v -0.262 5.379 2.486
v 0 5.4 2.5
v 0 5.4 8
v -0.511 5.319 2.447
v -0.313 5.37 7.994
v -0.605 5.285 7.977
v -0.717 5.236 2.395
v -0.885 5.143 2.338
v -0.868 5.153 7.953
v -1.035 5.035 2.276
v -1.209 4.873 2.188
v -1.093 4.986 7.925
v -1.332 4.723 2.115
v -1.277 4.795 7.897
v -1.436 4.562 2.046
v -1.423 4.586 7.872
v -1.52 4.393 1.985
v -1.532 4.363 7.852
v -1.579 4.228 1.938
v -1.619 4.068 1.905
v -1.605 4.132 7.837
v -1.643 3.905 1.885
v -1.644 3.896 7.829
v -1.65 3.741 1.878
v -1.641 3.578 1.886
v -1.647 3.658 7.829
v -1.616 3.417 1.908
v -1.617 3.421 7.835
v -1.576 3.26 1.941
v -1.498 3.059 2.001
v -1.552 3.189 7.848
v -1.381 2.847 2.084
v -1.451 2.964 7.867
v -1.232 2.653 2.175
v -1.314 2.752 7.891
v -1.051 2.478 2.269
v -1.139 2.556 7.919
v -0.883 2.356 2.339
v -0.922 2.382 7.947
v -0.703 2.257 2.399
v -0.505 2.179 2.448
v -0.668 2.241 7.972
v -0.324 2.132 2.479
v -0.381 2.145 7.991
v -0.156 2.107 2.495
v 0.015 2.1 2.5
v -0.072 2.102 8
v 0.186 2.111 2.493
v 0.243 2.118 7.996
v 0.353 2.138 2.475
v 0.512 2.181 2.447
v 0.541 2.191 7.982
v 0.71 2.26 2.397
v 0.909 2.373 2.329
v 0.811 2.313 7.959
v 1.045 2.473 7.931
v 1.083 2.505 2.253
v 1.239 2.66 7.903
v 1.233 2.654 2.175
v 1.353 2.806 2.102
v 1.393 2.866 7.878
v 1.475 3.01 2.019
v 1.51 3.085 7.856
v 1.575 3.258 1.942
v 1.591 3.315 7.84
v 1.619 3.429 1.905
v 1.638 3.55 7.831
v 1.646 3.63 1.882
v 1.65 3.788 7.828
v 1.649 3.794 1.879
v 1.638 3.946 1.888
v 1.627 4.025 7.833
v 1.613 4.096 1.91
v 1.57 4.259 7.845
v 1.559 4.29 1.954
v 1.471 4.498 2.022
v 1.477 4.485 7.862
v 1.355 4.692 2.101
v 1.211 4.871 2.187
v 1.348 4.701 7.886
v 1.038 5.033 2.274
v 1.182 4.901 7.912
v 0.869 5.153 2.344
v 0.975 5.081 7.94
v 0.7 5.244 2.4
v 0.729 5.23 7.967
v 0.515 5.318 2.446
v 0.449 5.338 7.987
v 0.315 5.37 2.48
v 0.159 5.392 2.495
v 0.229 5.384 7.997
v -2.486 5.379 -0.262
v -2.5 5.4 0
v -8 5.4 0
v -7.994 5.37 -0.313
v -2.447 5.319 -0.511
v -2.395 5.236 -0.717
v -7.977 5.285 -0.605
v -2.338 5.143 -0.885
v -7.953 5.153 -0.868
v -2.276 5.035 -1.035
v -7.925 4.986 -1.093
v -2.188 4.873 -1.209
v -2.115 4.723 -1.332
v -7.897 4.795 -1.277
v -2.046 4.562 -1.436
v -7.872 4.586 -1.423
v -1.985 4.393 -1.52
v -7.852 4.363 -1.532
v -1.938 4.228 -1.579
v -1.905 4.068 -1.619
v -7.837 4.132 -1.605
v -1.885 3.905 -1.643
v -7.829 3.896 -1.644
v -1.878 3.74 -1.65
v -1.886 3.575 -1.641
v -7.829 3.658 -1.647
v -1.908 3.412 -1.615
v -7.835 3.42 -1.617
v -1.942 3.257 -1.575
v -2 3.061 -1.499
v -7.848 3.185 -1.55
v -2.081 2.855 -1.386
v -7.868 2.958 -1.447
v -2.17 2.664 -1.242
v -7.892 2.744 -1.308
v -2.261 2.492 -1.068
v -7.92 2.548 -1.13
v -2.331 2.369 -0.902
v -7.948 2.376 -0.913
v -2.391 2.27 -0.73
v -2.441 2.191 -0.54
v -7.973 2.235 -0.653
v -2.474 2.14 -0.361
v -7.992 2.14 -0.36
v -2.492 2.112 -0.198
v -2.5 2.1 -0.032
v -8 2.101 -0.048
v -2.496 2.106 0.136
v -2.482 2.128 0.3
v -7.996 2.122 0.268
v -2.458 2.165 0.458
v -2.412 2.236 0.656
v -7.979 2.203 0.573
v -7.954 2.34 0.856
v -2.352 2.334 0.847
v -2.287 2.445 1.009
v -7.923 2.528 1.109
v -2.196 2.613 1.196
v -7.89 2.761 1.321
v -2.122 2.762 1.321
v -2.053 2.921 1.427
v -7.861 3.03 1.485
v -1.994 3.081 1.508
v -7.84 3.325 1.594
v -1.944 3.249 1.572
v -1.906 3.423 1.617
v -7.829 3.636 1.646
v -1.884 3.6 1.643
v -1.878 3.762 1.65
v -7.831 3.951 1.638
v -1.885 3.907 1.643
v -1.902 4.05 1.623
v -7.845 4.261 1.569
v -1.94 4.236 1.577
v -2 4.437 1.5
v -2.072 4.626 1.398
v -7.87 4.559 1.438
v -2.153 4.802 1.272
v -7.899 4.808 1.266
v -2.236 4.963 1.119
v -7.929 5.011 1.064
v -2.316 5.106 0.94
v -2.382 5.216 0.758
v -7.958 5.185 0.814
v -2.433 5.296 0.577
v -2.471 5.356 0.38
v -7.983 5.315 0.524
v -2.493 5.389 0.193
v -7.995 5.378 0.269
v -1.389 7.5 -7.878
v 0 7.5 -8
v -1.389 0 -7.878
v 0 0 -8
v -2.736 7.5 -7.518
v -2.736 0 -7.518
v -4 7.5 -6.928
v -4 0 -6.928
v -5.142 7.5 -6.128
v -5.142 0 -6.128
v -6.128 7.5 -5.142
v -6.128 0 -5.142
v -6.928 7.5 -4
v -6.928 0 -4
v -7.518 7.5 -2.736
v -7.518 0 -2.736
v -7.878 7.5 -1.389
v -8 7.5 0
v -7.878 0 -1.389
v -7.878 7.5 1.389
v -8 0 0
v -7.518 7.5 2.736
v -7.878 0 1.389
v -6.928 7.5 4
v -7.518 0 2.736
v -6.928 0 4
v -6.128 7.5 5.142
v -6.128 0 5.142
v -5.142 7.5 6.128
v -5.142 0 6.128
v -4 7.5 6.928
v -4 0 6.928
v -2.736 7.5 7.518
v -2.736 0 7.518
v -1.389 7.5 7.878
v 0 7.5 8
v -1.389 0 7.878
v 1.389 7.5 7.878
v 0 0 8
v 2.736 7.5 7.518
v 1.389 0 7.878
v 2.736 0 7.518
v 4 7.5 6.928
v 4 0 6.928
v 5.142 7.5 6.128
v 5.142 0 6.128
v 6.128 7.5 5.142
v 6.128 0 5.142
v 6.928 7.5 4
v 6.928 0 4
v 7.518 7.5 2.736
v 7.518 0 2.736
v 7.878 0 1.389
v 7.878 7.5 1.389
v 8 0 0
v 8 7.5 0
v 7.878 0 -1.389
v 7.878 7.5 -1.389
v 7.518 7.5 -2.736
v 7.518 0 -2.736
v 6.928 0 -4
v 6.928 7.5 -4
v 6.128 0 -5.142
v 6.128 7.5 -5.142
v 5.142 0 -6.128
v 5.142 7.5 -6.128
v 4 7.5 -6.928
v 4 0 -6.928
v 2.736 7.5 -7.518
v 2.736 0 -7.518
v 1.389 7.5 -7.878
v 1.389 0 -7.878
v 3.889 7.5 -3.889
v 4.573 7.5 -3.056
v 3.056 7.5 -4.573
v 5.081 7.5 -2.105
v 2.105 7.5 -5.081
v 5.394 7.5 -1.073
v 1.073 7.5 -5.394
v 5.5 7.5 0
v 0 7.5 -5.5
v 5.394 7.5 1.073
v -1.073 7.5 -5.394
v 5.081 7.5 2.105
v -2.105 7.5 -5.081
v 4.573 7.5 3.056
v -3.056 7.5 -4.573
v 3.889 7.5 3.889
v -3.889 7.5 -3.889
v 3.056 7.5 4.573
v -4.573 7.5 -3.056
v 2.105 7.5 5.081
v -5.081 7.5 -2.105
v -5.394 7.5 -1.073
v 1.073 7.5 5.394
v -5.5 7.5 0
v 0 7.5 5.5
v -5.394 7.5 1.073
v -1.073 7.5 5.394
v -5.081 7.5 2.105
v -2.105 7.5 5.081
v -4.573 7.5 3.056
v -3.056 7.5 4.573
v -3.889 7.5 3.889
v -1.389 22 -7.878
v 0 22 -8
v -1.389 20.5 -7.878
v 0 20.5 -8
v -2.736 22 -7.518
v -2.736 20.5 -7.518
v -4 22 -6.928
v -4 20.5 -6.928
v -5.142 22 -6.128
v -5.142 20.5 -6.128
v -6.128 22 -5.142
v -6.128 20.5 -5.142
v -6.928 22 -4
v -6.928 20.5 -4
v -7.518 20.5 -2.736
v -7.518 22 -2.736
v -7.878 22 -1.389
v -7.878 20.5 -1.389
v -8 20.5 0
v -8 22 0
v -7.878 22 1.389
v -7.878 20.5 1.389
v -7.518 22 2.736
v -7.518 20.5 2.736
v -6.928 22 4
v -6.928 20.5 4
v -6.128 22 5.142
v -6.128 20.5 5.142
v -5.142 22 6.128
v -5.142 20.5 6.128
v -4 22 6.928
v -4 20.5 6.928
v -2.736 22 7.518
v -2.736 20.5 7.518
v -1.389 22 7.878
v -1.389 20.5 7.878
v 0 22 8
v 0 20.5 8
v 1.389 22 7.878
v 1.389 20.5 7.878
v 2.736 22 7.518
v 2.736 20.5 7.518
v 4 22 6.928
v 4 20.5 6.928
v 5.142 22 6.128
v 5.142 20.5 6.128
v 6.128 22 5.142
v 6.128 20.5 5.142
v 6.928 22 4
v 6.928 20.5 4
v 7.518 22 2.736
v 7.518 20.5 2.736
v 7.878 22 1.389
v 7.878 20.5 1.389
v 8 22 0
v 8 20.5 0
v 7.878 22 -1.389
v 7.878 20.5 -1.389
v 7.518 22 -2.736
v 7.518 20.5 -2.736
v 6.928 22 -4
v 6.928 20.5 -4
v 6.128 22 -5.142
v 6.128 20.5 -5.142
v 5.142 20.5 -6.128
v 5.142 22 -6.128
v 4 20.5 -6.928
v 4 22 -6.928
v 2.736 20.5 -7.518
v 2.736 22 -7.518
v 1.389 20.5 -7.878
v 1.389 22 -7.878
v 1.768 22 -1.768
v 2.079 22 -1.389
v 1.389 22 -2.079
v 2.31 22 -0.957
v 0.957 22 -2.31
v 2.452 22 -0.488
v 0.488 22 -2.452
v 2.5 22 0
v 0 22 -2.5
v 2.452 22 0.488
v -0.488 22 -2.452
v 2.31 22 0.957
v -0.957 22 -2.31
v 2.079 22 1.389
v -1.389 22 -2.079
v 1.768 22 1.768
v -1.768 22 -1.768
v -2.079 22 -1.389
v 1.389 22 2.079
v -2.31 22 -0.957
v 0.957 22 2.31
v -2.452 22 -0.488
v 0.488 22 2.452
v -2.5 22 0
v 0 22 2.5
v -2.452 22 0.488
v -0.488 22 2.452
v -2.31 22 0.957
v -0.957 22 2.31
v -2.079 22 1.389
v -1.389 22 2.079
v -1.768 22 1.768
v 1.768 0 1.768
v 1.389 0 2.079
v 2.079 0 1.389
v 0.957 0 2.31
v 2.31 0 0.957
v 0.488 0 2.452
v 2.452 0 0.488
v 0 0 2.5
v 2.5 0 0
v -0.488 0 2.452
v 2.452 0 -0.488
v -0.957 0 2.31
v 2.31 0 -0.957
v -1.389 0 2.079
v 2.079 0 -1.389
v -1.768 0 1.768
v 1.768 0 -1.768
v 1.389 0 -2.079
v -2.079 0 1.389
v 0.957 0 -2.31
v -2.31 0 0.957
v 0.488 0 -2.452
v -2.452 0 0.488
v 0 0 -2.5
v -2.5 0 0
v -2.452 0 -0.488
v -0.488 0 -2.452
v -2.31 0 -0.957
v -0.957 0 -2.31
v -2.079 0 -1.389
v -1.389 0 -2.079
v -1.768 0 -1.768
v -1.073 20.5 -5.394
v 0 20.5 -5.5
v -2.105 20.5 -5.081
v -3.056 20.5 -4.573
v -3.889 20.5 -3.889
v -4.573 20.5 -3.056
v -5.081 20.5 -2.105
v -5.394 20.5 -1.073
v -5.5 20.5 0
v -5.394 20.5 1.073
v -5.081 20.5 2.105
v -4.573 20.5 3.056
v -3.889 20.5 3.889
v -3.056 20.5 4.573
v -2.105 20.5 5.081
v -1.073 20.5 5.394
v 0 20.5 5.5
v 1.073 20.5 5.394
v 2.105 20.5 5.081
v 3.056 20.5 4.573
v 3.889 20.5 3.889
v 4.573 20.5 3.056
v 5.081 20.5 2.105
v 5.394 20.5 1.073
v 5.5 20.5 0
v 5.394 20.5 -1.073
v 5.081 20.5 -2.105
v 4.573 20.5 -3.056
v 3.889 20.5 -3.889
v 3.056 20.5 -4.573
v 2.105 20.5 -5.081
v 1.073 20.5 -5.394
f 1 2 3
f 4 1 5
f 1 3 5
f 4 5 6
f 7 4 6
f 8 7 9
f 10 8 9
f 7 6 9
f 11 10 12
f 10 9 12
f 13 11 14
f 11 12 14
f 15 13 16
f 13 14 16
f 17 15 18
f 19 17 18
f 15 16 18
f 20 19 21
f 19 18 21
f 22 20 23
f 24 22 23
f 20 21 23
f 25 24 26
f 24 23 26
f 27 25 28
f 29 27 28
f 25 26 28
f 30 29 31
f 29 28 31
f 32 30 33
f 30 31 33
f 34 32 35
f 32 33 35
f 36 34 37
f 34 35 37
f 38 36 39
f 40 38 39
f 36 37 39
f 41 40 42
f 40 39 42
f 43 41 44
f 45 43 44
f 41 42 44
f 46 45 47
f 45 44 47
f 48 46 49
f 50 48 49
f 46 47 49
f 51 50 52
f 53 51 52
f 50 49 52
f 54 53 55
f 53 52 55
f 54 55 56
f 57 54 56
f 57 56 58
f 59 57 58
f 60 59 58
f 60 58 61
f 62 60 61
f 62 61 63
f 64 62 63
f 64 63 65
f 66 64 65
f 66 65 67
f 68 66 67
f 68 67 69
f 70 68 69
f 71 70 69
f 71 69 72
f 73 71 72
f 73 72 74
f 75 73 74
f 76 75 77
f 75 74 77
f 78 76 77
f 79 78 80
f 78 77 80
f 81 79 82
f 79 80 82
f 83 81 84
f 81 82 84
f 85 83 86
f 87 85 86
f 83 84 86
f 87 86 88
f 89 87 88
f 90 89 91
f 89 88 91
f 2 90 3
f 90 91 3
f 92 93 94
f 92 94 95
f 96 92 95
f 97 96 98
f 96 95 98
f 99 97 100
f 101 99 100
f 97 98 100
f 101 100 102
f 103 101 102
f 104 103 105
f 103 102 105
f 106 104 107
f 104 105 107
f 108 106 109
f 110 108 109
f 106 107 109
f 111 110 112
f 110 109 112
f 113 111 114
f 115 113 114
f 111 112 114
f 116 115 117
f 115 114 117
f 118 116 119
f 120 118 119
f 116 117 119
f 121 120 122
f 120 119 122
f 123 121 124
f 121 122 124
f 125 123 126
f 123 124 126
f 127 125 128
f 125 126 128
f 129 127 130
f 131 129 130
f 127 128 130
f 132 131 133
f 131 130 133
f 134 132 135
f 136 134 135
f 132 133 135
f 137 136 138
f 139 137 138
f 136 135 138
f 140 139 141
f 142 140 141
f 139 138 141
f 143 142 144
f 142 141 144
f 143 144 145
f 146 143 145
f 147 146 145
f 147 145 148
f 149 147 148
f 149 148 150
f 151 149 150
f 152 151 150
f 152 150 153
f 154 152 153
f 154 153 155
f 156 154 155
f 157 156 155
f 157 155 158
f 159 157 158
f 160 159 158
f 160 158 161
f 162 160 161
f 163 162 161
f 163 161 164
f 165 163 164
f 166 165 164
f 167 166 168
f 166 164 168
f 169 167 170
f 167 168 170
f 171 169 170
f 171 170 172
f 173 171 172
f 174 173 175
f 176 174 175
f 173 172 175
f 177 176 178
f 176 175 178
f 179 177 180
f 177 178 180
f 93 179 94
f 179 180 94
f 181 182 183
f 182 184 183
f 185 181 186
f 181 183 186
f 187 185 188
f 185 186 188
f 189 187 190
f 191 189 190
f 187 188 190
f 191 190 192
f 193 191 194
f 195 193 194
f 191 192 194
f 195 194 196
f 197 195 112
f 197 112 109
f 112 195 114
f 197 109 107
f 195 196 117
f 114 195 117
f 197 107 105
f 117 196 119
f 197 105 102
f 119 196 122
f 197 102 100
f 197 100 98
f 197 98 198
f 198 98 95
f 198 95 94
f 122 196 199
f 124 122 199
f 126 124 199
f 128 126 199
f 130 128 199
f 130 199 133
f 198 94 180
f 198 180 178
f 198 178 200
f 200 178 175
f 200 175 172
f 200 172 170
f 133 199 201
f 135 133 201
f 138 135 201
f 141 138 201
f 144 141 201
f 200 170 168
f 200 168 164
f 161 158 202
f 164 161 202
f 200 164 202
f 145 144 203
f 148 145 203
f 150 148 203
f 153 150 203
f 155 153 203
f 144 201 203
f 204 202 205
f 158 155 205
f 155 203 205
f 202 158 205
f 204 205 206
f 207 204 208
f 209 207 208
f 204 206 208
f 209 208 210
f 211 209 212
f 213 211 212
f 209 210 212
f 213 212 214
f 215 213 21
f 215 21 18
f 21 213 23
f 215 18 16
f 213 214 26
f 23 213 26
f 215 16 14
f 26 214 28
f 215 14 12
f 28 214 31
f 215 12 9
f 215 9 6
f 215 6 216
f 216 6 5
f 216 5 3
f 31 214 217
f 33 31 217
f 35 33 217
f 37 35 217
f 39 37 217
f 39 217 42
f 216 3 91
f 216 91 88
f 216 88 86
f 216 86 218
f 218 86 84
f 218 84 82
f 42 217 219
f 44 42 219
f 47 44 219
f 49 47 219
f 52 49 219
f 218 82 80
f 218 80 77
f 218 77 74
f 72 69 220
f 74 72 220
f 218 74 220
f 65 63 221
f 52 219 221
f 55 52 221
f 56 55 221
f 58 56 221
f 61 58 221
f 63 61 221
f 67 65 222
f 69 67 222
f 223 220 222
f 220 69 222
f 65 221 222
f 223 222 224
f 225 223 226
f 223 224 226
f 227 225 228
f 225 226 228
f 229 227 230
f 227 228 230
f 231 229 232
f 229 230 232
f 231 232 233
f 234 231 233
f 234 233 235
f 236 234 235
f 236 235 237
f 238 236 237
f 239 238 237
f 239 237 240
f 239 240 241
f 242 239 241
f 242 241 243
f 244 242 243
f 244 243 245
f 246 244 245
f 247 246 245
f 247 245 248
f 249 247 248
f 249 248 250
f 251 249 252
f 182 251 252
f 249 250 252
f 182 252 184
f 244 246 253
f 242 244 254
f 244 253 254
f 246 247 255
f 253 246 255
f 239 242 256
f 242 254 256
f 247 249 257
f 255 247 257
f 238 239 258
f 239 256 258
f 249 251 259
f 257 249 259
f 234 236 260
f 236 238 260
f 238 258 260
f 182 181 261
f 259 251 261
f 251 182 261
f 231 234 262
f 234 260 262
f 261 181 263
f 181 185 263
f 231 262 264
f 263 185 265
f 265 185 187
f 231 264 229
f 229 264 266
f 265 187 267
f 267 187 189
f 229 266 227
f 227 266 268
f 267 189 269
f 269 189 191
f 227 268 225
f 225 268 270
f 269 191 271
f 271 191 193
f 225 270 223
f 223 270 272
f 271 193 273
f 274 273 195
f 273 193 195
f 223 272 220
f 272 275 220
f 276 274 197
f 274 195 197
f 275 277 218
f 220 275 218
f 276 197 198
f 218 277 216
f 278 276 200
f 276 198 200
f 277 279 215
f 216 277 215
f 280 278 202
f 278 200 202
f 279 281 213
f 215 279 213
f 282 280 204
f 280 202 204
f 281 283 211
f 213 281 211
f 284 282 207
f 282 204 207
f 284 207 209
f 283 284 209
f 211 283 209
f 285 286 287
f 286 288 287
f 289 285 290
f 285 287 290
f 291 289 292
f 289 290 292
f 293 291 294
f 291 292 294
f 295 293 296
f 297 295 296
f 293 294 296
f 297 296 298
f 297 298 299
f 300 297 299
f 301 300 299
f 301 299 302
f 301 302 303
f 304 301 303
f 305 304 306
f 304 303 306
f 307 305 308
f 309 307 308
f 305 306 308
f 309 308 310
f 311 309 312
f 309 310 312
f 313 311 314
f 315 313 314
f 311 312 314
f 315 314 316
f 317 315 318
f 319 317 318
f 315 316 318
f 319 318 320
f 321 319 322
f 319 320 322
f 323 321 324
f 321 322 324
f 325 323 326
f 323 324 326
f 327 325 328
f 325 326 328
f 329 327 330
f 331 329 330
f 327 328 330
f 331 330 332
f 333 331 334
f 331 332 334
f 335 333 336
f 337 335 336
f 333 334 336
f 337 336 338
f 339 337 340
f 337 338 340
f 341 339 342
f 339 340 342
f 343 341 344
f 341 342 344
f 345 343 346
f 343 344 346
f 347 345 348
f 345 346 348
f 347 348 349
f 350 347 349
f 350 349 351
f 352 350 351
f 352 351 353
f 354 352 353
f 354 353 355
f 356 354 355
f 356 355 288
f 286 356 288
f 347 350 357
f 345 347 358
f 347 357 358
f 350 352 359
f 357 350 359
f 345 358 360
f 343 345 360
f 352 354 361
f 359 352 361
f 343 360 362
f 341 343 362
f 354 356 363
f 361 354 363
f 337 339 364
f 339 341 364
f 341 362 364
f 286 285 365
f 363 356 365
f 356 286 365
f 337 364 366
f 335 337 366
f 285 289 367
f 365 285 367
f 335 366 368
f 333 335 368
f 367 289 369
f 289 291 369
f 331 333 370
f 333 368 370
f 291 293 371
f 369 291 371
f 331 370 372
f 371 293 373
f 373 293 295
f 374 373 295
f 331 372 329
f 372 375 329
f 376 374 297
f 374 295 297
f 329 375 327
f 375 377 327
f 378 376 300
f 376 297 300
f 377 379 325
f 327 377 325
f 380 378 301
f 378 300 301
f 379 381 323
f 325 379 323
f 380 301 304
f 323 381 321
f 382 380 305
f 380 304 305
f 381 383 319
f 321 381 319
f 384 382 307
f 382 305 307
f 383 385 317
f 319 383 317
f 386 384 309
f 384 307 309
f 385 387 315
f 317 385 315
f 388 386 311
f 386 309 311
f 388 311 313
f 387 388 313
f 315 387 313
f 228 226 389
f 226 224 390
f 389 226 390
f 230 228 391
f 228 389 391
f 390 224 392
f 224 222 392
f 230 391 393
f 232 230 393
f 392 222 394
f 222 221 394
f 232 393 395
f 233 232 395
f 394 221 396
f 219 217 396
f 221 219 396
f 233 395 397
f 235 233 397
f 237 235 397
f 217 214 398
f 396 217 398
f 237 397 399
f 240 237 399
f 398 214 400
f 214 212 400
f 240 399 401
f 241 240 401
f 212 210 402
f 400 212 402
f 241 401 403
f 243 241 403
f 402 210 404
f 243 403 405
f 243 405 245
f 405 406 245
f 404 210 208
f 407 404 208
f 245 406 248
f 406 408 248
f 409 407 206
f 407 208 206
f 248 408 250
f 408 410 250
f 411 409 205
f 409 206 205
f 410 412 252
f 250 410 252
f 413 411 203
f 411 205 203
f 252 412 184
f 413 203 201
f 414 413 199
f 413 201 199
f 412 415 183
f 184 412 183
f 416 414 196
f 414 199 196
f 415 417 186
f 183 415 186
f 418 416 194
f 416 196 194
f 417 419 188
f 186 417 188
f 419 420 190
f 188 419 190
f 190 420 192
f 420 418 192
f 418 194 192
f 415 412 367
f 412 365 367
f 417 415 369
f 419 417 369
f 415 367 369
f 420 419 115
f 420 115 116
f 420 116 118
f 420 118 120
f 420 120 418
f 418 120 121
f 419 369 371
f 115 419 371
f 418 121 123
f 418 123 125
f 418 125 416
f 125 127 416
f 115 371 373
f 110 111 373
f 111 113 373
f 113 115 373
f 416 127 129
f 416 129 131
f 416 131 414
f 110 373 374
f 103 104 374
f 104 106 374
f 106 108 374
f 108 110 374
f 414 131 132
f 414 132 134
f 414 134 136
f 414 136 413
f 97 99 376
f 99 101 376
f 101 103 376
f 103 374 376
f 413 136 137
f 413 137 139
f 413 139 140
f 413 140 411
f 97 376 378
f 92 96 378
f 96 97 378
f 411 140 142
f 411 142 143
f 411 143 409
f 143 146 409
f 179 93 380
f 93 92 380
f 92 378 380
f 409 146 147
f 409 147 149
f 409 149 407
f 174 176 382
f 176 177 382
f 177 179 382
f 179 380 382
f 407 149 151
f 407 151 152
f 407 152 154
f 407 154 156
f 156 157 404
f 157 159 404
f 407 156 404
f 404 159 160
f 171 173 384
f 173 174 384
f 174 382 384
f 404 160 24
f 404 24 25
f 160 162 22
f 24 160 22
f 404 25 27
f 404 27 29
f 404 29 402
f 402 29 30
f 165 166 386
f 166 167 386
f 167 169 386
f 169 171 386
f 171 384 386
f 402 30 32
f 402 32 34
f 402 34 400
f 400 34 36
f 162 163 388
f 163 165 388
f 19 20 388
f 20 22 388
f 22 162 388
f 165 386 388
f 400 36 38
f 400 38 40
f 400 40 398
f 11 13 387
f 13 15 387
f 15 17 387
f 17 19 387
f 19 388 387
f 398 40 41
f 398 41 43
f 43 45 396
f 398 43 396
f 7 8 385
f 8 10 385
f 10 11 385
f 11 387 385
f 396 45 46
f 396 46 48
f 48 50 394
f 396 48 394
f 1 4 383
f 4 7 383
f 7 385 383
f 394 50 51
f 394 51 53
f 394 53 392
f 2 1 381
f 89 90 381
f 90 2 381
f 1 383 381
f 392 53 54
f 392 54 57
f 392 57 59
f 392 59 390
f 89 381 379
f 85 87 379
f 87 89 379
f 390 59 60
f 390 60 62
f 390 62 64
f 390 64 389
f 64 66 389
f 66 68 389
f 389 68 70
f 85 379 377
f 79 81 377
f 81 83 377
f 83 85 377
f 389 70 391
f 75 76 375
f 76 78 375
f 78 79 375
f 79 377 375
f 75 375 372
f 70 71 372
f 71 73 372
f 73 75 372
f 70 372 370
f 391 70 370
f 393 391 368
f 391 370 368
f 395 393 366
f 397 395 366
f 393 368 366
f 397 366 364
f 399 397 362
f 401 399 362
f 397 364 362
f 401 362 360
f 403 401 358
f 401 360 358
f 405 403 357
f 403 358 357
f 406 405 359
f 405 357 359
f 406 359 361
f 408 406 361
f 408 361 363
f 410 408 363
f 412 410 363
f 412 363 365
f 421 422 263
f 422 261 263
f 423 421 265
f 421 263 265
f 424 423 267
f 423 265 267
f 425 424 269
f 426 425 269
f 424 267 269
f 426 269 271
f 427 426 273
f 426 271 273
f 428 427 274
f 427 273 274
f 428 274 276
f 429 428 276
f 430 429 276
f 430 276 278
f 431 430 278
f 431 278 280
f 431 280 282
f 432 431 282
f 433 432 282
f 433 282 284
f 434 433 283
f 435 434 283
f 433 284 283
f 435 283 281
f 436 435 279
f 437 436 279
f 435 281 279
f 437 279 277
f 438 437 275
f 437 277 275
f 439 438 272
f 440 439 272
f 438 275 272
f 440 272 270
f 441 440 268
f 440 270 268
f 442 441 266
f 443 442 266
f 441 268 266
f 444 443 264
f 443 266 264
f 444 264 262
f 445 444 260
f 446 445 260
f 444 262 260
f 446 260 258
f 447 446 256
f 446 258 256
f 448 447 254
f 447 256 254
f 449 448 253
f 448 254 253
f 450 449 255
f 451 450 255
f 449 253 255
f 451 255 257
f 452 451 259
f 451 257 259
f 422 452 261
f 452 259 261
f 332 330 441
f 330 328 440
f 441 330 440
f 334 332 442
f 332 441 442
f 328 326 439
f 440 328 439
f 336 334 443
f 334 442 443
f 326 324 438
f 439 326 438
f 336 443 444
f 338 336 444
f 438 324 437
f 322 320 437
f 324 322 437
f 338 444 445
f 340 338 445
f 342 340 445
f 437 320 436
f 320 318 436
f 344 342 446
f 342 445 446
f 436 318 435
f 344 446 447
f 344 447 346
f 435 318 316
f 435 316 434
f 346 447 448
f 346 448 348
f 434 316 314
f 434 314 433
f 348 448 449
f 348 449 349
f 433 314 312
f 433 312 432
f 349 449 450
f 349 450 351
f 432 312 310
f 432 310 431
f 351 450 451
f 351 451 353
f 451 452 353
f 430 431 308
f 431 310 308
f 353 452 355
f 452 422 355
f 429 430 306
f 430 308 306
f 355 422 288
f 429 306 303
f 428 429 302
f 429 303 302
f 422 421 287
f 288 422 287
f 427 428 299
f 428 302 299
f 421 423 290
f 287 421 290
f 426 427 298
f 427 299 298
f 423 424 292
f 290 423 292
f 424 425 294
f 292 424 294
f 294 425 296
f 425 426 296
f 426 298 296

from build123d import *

# Parameters (mm, degrees)
CROQUIS3_W     = 1.65
CROQUIS3_H     = 8.001
MATRIZC1_COUNT = 2
MATRIZC1_ANGLE = 90


with BuildPart() as part:
    # Croquis1 → Revolución1 (revolve)
    with BuildSketch(Plane.XY, mode=Mode.PRIVATE) as revoluci_n1_sk:
        Polygon((8, 7.5), (8, 0), (2.5, 0), (2.5, 22), (8, 22), (8, 20.5), (5.5, 20.5), (5.5, 7.5), align=None)
    revolve(revoluci_n1_sk.sketch.rotate(Axis((0, 0, 0), (0, 1, 0)), 90), axis=Axis((0, 0, 0), (0, 1, 0)))

    # Croquis3 → Taladro roscado M41 (revolve, cut)
    with BuildSketch(Plane(origin=(0, 3.75, 0), x_dir=(0, 1, 0), z_dir=(1, 0, 0))):
        with Locations((0.825, 4.0005)):
            Rectangle(CROQUIS3_W, CROQUIS3_H)
    taladro_roscado_m41 = revolve(axis=Axis((0, 3.75, -6.35), (0, 0, 1)), mode=Mode.SUBTRACT)

    # MatrizC1: Taladro roscado M41 ×2 about axis
    matrizc1_axis = Axis((0, 0, 0), (0, -1, 0))
    for i in range(1, MATRIZC1_COUNT):
        add(taladro_roscado_m41.rotate(matrizc1_axis, i * MATRIZC1_ANGLE / (MATRIZC1_COUNT - 1)), mode=Mode.SUBTRACT)


solid = part.part
